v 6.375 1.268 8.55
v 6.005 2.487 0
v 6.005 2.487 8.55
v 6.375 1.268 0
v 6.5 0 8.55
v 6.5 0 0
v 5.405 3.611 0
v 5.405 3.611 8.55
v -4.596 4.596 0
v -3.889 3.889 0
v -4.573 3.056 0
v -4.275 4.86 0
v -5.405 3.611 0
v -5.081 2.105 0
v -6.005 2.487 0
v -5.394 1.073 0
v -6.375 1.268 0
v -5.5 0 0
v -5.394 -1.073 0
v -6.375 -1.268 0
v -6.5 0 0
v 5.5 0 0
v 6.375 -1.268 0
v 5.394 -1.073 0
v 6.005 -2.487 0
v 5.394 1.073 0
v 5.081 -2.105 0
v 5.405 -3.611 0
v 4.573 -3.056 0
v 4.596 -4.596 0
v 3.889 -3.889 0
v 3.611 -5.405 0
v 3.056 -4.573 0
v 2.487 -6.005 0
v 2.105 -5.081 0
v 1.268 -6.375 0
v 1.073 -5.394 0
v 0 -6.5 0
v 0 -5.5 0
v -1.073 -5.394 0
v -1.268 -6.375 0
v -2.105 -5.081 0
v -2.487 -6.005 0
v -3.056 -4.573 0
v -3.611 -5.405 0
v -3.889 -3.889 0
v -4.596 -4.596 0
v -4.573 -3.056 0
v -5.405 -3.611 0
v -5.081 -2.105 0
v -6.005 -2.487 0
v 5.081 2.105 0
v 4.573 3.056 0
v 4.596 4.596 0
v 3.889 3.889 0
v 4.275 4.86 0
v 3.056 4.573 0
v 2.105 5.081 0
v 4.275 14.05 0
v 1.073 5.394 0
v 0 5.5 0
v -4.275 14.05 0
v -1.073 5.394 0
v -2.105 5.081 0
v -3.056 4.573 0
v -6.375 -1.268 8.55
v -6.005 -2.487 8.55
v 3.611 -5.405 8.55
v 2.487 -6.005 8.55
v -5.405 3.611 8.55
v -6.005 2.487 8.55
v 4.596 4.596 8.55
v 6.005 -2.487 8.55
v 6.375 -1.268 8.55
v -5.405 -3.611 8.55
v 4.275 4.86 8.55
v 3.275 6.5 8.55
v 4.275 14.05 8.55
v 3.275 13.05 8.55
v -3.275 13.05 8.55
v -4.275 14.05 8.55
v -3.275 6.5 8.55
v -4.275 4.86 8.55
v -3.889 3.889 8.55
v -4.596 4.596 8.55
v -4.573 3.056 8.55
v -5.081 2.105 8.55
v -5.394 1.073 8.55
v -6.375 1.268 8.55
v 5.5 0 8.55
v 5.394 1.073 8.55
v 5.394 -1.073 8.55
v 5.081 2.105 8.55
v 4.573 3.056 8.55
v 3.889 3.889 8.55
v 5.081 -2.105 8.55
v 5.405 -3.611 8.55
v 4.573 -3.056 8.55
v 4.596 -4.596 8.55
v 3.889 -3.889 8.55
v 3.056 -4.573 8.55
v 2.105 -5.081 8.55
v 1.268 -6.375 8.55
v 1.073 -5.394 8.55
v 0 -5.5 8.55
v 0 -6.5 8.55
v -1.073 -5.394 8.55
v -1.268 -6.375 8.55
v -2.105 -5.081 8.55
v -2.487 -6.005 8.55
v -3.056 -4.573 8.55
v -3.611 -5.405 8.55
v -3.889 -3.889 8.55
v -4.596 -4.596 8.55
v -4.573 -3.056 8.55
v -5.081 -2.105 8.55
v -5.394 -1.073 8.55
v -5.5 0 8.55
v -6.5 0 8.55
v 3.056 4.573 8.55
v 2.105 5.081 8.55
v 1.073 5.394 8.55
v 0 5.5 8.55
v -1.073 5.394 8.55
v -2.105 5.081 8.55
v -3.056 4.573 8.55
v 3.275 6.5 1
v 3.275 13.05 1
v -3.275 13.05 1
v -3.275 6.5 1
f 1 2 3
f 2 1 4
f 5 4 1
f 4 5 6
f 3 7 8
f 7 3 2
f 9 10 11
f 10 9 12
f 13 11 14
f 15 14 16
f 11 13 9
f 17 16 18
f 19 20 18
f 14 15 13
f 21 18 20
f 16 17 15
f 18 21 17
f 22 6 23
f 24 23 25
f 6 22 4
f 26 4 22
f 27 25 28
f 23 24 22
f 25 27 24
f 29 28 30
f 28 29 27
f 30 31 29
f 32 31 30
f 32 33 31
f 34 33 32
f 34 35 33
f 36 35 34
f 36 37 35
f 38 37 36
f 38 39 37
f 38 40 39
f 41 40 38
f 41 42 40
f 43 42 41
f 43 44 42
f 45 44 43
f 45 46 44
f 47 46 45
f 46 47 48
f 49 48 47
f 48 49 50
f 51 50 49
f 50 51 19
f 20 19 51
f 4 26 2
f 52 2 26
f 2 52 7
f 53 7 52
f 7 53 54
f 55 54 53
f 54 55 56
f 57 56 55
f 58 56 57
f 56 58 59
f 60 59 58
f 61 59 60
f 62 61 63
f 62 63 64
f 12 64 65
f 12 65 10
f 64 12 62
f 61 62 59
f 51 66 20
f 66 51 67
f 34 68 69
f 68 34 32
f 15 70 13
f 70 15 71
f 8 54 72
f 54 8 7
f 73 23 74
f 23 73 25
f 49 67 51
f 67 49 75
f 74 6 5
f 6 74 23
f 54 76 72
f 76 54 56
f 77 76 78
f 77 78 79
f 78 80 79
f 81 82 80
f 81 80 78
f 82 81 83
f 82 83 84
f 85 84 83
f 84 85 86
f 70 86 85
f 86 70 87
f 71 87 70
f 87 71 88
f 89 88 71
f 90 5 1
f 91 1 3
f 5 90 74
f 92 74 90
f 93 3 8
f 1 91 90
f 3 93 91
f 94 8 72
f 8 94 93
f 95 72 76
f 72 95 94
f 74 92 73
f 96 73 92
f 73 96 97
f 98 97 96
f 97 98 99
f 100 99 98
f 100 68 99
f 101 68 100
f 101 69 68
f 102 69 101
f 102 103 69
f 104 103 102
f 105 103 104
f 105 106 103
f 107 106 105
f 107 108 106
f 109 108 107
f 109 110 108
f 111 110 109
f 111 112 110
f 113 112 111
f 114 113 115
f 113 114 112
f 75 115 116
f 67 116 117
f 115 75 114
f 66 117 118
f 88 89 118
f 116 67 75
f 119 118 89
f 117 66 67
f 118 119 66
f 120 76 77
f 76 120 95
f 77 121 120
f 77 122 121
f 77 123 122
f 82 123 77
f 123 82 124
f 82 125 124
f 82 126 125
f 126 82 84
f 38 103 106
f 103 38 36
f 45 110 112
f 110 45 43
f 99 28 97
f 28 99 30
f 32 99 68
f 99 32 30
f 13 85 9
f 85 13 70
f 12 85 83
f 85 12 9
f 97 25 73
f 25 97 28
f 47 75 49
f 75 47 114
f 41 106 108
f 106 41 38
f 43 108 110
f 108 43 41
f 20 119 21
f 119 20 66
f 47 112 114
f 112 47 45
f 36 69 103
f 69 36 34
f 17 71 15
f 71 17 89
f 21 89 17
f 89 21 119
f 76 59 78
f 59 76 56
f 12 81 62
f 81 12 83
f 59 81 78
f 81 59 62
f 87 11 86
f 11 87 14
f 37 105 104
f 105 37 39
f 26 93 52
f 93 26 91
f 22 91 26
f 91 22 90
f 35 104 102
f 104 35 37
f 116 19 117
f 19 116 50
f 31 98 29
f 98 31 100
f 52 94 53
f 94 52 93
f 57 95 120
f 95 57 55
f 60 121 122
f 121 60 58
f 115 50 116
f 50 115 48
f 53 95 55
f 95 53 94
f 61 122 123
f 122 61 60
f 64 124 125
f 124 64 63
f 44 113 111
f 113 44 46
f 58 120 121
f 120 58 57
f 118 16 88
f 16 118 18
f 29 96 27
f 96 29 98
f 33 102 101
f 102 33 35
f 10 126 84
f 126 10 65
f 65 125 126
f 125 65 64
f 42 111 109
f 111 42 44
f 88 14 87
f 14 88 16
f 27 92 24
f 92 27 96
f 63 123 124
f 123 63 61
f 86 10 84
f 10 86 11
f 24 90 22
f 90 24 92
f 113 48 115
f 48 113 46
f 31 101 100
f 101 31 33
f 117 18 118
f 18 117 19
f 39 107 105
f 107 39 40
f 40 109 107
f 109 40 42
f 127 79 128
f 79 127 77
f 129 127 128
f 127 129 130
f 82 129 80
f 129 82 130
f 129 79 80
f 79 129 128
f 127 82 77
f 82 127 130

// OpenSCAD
// author: clayb.rpi@gmail.com
// date: 2013-01-27
// units: mm
//
// description: A small plastic piece to hold a magnet cube
//   and a whiteboard marker together.

// The diameter (mm) of the pen to hold. This should be a tight fit.
PEN_DIAMETER = 11;

// The side length (mm) of the magnet cube (assumed to be equal on all sides).
MAGNET_CUBE_SIZE = 6.55;

// The minimum wall thickness (mm).
MIN_WALL_THICKNESS = 1;

// How detailed the print should be.
$fn=32 + 0; // the '+ 0' prevents customizer from displaying this variable.

// The main unit of height
TOTAL_H =  MAGNET_CUBE_SIZE + 2 * MIN_WALL_THICKNESS;

difference() {
  union() {
  	cylinder(r=PEN_DIAMETER/2 + MIN_WALL_THICKNESS, h=MAGNET_CUBE_SIZE + 2 * MIN_WALL_THICKNESS);

    translate([-TOTAL_H / 2, 0, 0])
    cube([TOTAL_H, PEN_DIAMETER / 2 + TOTAL_H, TOTAL_H]);
  }

  // cut away a place for the pen.
  translate([0, 0, -1])
	cylinder(r=PEN_DIAMETER/2, h=MAGNET_CUBE_SIZE + 2 * MIN_WALL_THICKNESS + 2);

  // cut away a place for the magnet.
  translate([-MAGNET_CUBE_SIZE / 2, PEN_DIAMETER /2 + MIN_WALL_THICKNESS, MIN_WALL_THICKNESS])
  cube([MAGNET_CUBE_SIZE,
        MAGNET_CUBE_SIZE,
        MAGNET_CUBE_SIZE + MIN_WALL_THICKNESS + 1]);
}
